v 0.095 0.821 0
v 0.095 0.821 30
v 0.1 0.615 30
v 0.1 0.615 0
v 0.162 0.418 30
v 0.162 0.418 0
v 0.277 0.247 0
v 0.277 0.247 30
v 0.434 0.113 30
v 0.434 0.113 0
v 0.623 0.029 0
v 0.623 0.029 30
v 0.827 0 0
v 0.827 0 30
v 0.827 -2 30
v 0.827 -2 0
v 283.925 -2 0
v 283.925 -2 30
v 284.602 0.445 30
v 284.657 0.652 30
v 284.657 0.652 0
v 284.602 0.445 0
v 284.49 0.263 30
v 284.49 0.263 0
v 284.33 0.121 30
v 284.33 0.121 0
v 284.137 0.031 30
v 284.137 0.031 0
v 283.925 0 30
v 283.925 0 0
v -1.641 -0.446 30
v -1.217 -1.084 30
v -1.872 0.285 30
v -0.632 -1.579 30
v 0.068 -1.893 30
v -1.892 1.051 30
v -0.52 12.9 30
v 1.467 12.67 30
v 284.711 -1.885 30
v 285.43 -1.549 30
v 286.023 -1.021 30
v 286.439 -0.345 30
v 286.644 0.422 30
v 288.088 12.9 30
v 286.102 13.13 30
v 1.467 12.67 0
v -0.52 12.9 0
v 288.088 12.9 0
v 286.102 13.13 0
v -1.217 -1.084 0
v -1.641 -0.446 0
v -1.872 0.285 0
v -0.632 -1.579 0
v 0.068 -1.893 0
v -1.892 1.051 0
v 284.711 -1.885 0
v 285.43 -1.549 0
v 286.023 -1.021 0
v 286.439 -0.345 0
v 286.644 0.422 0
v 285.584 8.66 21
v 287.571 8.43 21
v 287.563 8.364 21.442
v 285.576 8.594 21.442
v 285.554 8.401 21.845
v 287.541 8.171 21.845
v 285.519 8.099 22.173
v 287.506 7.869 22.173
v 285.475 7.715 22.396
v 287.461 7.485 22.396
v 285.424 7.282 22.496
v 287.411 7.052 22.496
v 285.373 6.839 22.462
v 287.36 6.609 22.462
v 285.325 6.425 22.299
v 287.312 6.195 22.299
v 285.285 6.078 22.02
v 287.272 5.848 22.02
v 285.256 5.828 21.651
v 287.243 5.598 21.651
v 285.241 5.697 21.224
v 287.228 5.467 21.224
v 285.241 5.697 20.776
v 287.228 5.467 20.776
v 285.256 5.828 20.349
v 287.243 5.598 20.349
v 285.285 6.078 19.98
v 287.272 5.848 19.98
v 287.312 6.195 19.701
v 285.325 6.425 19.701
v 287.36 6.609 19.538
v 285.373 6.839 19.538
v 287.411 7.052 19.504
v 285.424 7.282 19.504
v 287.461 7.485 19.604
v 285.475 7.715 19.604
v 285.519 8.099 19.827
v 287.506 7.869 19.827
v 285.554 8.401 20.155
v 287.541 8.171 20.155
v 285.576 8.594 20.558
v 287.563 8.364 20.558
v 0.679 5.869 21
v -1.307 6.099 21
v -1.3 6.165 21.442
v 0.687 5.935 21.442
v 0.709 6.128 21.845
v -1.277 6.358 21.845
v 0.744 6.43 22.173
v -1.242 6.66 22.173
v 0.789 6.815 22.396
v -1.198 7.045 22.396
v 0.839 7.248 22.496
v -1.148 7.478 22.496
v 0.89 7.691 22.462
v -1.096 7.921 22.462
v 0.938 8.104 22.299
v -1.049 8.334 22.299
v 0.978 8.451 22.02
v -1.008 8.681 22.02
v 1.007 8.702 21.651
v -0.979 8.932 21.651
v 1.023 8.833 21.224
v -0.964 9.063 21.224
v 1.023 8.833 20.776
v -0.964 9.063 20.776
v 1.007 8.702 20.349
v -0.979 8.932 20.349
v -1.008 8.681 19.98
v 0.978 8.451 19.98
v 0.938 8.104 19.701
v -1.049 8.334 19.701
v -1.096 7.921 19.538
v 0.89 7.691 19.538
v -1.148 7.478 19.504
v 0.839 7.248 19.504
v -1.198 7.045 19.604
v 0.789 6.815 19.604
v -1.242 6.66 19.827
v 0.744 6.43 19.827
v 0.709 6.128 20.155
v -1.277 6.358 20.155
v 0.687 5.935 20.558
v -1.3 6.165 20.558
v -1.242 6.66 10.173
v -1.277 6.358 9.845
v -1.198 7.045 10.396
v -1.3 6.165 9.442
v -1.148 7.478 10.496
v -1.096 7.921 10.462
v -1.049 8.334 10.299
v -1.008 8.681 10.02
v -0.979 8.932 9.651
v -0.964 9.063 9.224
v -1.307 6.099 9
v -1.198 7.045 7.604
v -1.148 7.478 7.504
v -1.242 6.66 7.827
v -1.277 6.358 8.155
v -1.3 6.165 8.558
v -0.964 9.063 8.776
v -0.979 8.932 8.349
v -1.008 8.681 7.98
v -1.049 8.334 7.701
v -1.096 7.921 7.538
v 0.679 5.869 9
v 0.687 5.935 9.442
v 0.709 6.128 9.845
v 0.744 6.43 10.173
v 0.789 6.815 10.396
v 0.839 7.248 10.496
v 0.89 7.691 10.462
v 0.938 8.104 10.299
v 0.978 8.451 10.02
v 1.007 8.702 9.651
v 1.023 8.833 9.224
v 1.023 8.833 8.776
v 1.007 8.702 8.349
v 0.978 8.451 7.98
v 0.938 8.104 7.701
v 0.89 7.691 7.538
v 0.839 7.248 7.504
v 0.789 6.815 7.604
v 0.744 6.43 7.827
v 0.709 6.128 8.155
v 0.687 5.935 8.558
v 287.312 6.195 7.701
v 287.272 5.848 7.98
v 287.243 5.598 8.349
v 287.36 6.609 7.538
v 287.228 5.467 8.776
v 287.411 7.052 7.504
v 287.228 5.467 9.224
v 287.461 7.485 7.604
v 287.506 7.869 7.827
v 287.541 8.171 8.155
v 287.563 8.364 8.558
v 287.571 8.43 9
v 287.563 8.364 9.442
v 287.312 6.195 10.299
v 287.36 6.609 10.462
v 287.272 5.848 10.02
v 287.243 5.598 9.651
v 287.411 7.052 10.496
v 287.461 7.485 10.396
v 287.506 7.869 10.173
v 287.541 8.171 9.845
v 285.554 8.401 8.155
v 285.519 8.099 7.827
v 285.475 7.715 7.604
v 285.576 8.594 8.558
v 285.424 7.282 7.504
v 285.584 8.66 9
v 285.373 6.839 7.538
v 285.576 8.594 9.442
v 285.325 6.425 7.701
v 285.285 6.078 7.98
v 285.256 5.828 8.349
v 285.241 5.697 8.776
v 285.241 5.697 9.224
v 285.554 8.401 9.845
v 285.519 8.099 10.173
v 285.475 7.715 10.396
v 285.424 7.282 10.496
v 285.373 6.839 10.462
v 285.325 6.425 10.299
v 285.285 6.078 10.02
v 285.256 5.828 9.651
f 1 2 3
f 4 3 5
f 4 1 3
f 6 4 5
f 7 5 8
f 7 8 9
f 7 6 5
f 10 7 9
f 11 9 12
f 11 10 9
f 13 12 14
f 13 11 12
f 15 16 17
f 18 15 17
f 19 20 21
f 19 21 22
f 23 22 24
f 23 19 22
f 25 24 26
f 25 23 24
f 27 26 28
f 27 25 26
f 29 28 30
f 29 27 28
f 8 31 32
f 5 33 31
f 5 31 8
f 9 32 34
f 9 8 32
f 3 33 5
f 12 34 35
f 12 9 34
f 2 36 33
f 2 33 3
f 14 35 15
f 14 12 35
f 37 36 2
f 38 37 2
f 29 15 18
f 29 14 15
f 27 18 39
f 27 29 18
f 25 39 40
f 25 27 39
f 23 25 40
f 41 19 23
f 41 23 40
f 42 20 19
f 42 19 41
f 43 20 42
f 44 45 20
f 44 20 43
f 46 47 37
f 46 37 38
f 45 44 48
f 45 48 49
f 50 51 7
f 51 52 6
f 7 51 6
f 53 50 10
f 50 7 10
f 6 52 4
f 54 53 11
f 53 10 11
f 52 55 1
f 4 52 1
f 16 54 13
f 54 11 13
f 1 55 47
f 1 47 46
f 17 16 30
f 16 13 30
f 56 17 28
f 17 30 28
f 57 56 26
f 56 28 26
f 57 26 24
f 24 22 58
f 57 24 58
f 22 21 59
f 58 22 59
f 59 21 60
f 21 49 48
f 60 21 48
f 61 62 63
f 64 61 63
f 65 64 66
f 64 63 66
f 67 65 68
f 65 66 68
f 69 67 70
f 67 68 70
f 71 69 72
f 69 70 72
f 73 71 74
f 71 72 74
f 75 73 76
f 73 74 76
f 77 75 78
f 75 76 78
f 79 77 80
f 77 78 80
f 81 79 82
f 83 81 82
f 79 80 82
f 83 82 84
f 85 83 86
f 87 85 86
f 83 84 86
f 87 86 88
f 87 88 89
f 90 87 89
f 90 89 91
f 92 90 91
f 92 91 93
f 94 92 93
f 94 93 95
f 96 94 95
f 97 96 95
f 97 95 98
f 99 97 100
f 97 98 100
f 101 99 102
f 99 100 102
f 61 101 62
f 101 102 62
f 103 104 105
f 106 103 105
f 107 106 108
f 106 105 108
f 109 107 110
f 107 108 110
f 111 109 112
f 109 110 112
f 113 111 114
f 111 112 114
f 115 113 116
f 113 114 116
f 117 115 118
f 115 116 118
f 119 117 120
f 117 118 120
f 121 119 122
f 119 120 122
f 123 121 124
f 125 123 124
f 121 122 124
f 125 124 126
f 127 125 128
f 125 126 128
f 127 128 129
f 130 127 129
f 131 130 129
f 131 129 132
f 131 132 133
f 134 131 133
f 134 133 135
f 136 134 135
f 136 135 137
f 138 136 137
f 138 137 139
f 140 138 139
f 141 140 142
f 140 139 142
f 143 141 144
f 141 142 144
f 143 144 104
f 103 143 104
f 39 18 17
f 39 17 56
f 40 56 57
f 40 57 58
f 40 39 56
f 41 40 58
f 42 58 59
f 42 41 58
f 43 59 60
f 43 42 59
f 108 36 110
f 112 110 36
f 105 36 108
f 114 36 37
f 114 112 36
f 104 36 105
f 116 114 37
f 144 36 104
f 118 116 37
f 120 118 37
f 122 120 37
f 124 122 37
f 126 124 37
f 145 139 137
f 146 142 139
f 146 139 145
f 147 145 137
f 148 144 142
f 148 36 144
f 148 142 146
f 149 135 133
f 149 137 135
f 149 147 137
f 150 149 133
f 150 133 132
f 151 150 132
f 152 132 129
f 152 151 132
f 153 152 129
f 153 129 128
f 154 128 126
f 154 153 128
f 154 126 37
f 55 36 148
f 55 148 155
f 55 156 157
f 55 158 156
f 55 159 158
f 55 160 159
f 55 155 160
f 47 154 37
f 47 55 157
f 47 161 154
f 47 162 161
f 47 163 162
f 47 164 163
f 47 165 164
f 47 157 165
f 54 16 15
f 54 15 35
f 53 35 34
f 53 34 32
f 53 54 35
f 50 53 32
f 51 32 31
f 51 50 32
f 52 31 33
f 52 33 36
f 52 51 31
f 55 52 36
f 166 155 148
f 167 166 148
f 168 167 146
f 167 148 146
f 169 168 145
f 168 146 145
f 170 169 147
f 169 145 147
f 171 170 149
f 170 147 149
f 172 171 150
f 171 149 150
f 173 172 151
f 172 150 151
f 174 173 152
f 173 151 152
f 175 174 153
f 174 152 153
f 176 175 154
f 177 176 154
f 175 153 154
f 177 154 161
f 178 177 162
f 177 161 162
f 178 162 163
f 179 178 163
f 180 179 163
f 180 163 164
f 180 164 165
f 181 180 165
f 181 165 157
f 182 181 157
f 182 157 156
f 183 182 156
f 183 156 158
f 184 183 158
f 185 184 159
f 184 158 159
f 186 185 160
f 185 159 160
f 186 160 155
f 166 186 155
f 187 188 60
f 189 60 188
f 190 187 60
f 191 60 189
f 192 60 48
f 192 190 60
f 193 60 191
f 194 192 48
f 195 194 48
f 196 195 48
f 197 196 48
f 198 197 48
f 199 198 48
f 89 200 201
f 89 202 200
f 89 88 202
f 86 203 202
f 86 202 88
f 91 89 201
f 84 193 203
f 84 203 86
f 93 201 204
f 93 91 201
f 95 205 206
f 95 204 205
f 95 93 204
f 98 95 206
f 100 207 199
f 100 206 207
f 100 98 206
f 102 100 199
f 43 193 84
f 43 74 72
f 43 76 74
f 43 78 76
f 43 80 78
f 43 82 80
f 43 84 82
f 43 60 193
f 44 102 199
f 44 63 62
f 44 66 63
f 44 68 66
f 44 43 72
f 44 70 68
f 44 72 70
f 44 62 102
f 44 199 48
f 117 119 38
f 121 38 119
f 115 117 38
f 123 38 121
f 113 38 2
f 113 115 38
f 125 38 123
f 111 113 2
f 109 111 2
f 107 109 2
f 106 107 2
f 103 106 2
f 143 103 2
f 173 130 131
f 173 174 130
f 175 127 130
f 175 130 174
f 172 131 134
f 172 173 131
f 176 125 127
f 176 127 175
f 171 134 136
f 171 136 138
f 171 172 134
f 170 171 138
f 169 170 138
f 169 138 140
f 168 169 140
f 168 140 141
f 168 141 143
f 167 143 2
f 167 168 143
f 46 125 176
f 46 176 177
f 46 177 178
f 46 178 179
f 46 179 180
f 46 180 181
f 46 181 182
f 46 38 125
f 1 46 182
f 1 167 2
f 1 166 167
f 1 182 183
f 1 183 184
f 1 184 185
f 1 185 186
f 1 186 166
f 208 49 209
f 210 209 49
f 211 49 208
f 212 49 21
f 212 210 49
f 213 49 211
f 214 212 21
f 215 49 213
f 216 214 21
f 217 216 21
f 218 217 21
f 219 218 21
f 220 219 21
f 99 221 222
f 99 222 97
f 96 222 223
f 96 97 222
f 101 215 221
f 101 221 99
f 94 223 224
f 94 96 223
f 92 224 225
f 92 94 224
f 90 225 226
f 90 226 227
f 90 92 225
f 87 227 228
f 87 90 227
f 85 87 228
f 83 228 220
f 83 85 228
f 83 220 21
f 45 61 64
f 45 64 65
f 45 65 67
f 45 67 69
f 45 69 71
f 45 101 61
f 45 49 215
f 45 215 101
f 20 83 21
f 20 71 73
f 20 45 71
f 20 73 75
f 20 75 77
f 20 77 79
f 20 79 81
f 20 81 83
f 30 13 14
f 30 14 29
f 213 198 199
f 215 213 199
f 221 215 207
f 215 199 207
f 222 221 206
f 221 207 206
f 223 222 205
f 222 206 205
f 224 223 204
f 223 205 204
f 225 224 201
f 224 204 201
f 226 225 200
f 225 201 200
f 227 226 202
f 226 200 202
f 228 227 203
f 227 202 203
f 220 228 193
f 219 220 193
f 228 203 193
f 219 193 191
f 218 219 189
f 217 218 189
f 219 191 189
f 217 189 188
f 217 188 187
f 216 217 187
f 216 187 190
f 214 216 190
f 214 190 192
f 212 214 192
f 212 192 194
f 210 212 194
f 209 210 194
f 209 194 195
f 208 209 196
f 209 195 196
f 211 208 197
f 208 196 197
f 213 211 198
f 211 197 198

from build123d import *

# Parameters (mm, degrees)
SKETCH1_W                    = 284.5815
SKETCH1_H                    = 30
BASE_FLANGE1_DEPTH           = 2
EDGE_FLANGE1_STRIP_CUT_DEPTH = 30
EDGE_FLANGE1_DEPTH           = 30
EDGE_FLANGE2_STRIP_CUT_DEPTH = 30
EDGE_FLANGE2_DEPTH           = 30
SKETCH10_R                   = 1.5
MOUNTING_HOLES_DEPTH         = 2
SKETCH11_R                   = 1.5
CUT_EXTRUDE2_DEPTH           = 2


# Sheet-metal steps are written as plain solids
with BuildPart() as part:
    # Sketch1 → Base-Flange1 (new body)
    with BuildSketch(Plane(origin=(0, 0, 0), x_dir=(1, 0, 0), z_dir=(0, 1, 0))):
        with Locations((142.29075, -15)):
            Rectangle(SKETCH1_W, SKETCH1_H)
    extrude(amount=-BASE_FLANGE1_DEPTH)

    # Edge-Flange1 strip (across the edge) → Edge-Flange1 strip cut (cut)
    with BuildSketch(Plane(origin=(0, 0, 0), x_dir=(0.9933652782994915, -0.1150018428938158, 0), z_dir=(0, 0, 1))):
        Polygon((-9.511321415, -3.11448322), (1.051314043, -1.891647502), (0.821310357, 0.095083054), (-9.741325101, -1.127752664), align=None)
    extrude(amount=EDGE_FLANGE1_STRIP_CUT_DEPTH, mode=Mode.SUBTRACT)

    # Edge-Flange1 section (across the edge) → Edge-Flange1 (add)
    with BuildSketch(Plane(origin=(0, 0, 0), x_dir=(0.9933652782994915, -0.1150018428938158, 0), z_dir=(0, 0, 1))):
        with BuildLine():
            Line((-2, 0.826795918), (-2, 12.755102041))
            Line((-2, 12.755102041), (0, 12.755102041))
            Line((0, 12.755102041), (0, 0.826795918))
            ThreePointArc((0, 0.826795918), (0.246609229, 0.276806278), (0.821310357, 0.095083054))
            Line((0.821310357, 0.095083054), (1.051314043, -1.891647502))
            ThreePointArc((1.051314043, -1.891647502), (-1.083802855, -1.216513409), (-2, 0.826795918))
        make_face()
    extrude(amount=EDGE_FLANGE1_DEPTH)

    # Edge-Flange2 strip (across the edge) → Edge-Flange2 strip cut (cut)
    with BuildSketch(Plane(origin=(284.5815, 0, 30), x_dir=(-0.9933652782994906, 0.11500184289382274, 0), z_dir=(0, 0, -1))):
        Polygon((-8.988461998, -0.972764326), (0.421885957, -2.062199784), (0.651889643, -0.075469228), (-8.758458312, 1.013966231), align=None)
    extrude(amount=EDGE_FLANGE2_STRIP_CUT_DEPTH, mode=Mode.SUBTRACT)

    # Edge-Flange2 section (across the edge) → Edge-Flange2 (add)
    with BuildSketch(Plane(origin=(284.5815, 0, 30), x_dir=(-0.9933652782994906, 0.11500184289382274, 0), z_dir=(0, 0, -1))):
        with BuildLine():
            Line((-2, 0.656243636), (-2, 13.218181818))
            Line((-2, 13.218181818), (0, 13.218181818))
            Line((0, 13.218181818), (0, 0.656243636))
            ThreePointArc((0, 0.656243636), (0.186610359, 0.166252866), (0.651889643, -0.075469228))
            Line((0.651889643, -0.075469228), (0.421885957, -2.062199784))
            ThreePointArc((0.421885957, -2.062199784), (-1.306709327, -1.164159219), (-2, 0.656243636))
        make_face()
    extrude(amount=EDGE_FLANGE2_DEPTH)

    # Sketch10 → Mounting Holes (cut)
    with BuildSketch(Plane(origin=(-1.986730557, 0.230003686, 0), x_dir=(0, 0, 1), z_dir=(-0.9933652782994914, 0.11500184289381583, 0))):
        with Locations(Location((9, 7.408352498, 0), (0, 0, 270))):
            Circle(SKETCH10_R)
        with Locations(Location((21, 7.408352498, 0), (0, 0, 270))):
            Circle(SKETCH10_R)
    extrude(amount=-MOUNTING_HOLES_DEPTH, mode=Mode.SUBTRACT)

    # Sketch11 → Cut-Extrude2 (cut)
    with BuildSketch(Plane(origin=(282.804519594, -32.740263469, 0), x_dir=(0, 0, -1), z_dir=(0.9933652782994908, -0.11500184289382205, 0))):
        with Locations(Location((-21, 39.945578772, 0), (0, 0, 90))):
            Circle(SKETCH11_R)
        with Locations(Location((-9, 39.945578772, 0), (0, 0, 90))):
            Circle(SKETCH11_R)
    extrude(amount=-CUT_EXTRUDE2_DEPTH, mode=Mode.SUBTRACT)


solid = part.part
